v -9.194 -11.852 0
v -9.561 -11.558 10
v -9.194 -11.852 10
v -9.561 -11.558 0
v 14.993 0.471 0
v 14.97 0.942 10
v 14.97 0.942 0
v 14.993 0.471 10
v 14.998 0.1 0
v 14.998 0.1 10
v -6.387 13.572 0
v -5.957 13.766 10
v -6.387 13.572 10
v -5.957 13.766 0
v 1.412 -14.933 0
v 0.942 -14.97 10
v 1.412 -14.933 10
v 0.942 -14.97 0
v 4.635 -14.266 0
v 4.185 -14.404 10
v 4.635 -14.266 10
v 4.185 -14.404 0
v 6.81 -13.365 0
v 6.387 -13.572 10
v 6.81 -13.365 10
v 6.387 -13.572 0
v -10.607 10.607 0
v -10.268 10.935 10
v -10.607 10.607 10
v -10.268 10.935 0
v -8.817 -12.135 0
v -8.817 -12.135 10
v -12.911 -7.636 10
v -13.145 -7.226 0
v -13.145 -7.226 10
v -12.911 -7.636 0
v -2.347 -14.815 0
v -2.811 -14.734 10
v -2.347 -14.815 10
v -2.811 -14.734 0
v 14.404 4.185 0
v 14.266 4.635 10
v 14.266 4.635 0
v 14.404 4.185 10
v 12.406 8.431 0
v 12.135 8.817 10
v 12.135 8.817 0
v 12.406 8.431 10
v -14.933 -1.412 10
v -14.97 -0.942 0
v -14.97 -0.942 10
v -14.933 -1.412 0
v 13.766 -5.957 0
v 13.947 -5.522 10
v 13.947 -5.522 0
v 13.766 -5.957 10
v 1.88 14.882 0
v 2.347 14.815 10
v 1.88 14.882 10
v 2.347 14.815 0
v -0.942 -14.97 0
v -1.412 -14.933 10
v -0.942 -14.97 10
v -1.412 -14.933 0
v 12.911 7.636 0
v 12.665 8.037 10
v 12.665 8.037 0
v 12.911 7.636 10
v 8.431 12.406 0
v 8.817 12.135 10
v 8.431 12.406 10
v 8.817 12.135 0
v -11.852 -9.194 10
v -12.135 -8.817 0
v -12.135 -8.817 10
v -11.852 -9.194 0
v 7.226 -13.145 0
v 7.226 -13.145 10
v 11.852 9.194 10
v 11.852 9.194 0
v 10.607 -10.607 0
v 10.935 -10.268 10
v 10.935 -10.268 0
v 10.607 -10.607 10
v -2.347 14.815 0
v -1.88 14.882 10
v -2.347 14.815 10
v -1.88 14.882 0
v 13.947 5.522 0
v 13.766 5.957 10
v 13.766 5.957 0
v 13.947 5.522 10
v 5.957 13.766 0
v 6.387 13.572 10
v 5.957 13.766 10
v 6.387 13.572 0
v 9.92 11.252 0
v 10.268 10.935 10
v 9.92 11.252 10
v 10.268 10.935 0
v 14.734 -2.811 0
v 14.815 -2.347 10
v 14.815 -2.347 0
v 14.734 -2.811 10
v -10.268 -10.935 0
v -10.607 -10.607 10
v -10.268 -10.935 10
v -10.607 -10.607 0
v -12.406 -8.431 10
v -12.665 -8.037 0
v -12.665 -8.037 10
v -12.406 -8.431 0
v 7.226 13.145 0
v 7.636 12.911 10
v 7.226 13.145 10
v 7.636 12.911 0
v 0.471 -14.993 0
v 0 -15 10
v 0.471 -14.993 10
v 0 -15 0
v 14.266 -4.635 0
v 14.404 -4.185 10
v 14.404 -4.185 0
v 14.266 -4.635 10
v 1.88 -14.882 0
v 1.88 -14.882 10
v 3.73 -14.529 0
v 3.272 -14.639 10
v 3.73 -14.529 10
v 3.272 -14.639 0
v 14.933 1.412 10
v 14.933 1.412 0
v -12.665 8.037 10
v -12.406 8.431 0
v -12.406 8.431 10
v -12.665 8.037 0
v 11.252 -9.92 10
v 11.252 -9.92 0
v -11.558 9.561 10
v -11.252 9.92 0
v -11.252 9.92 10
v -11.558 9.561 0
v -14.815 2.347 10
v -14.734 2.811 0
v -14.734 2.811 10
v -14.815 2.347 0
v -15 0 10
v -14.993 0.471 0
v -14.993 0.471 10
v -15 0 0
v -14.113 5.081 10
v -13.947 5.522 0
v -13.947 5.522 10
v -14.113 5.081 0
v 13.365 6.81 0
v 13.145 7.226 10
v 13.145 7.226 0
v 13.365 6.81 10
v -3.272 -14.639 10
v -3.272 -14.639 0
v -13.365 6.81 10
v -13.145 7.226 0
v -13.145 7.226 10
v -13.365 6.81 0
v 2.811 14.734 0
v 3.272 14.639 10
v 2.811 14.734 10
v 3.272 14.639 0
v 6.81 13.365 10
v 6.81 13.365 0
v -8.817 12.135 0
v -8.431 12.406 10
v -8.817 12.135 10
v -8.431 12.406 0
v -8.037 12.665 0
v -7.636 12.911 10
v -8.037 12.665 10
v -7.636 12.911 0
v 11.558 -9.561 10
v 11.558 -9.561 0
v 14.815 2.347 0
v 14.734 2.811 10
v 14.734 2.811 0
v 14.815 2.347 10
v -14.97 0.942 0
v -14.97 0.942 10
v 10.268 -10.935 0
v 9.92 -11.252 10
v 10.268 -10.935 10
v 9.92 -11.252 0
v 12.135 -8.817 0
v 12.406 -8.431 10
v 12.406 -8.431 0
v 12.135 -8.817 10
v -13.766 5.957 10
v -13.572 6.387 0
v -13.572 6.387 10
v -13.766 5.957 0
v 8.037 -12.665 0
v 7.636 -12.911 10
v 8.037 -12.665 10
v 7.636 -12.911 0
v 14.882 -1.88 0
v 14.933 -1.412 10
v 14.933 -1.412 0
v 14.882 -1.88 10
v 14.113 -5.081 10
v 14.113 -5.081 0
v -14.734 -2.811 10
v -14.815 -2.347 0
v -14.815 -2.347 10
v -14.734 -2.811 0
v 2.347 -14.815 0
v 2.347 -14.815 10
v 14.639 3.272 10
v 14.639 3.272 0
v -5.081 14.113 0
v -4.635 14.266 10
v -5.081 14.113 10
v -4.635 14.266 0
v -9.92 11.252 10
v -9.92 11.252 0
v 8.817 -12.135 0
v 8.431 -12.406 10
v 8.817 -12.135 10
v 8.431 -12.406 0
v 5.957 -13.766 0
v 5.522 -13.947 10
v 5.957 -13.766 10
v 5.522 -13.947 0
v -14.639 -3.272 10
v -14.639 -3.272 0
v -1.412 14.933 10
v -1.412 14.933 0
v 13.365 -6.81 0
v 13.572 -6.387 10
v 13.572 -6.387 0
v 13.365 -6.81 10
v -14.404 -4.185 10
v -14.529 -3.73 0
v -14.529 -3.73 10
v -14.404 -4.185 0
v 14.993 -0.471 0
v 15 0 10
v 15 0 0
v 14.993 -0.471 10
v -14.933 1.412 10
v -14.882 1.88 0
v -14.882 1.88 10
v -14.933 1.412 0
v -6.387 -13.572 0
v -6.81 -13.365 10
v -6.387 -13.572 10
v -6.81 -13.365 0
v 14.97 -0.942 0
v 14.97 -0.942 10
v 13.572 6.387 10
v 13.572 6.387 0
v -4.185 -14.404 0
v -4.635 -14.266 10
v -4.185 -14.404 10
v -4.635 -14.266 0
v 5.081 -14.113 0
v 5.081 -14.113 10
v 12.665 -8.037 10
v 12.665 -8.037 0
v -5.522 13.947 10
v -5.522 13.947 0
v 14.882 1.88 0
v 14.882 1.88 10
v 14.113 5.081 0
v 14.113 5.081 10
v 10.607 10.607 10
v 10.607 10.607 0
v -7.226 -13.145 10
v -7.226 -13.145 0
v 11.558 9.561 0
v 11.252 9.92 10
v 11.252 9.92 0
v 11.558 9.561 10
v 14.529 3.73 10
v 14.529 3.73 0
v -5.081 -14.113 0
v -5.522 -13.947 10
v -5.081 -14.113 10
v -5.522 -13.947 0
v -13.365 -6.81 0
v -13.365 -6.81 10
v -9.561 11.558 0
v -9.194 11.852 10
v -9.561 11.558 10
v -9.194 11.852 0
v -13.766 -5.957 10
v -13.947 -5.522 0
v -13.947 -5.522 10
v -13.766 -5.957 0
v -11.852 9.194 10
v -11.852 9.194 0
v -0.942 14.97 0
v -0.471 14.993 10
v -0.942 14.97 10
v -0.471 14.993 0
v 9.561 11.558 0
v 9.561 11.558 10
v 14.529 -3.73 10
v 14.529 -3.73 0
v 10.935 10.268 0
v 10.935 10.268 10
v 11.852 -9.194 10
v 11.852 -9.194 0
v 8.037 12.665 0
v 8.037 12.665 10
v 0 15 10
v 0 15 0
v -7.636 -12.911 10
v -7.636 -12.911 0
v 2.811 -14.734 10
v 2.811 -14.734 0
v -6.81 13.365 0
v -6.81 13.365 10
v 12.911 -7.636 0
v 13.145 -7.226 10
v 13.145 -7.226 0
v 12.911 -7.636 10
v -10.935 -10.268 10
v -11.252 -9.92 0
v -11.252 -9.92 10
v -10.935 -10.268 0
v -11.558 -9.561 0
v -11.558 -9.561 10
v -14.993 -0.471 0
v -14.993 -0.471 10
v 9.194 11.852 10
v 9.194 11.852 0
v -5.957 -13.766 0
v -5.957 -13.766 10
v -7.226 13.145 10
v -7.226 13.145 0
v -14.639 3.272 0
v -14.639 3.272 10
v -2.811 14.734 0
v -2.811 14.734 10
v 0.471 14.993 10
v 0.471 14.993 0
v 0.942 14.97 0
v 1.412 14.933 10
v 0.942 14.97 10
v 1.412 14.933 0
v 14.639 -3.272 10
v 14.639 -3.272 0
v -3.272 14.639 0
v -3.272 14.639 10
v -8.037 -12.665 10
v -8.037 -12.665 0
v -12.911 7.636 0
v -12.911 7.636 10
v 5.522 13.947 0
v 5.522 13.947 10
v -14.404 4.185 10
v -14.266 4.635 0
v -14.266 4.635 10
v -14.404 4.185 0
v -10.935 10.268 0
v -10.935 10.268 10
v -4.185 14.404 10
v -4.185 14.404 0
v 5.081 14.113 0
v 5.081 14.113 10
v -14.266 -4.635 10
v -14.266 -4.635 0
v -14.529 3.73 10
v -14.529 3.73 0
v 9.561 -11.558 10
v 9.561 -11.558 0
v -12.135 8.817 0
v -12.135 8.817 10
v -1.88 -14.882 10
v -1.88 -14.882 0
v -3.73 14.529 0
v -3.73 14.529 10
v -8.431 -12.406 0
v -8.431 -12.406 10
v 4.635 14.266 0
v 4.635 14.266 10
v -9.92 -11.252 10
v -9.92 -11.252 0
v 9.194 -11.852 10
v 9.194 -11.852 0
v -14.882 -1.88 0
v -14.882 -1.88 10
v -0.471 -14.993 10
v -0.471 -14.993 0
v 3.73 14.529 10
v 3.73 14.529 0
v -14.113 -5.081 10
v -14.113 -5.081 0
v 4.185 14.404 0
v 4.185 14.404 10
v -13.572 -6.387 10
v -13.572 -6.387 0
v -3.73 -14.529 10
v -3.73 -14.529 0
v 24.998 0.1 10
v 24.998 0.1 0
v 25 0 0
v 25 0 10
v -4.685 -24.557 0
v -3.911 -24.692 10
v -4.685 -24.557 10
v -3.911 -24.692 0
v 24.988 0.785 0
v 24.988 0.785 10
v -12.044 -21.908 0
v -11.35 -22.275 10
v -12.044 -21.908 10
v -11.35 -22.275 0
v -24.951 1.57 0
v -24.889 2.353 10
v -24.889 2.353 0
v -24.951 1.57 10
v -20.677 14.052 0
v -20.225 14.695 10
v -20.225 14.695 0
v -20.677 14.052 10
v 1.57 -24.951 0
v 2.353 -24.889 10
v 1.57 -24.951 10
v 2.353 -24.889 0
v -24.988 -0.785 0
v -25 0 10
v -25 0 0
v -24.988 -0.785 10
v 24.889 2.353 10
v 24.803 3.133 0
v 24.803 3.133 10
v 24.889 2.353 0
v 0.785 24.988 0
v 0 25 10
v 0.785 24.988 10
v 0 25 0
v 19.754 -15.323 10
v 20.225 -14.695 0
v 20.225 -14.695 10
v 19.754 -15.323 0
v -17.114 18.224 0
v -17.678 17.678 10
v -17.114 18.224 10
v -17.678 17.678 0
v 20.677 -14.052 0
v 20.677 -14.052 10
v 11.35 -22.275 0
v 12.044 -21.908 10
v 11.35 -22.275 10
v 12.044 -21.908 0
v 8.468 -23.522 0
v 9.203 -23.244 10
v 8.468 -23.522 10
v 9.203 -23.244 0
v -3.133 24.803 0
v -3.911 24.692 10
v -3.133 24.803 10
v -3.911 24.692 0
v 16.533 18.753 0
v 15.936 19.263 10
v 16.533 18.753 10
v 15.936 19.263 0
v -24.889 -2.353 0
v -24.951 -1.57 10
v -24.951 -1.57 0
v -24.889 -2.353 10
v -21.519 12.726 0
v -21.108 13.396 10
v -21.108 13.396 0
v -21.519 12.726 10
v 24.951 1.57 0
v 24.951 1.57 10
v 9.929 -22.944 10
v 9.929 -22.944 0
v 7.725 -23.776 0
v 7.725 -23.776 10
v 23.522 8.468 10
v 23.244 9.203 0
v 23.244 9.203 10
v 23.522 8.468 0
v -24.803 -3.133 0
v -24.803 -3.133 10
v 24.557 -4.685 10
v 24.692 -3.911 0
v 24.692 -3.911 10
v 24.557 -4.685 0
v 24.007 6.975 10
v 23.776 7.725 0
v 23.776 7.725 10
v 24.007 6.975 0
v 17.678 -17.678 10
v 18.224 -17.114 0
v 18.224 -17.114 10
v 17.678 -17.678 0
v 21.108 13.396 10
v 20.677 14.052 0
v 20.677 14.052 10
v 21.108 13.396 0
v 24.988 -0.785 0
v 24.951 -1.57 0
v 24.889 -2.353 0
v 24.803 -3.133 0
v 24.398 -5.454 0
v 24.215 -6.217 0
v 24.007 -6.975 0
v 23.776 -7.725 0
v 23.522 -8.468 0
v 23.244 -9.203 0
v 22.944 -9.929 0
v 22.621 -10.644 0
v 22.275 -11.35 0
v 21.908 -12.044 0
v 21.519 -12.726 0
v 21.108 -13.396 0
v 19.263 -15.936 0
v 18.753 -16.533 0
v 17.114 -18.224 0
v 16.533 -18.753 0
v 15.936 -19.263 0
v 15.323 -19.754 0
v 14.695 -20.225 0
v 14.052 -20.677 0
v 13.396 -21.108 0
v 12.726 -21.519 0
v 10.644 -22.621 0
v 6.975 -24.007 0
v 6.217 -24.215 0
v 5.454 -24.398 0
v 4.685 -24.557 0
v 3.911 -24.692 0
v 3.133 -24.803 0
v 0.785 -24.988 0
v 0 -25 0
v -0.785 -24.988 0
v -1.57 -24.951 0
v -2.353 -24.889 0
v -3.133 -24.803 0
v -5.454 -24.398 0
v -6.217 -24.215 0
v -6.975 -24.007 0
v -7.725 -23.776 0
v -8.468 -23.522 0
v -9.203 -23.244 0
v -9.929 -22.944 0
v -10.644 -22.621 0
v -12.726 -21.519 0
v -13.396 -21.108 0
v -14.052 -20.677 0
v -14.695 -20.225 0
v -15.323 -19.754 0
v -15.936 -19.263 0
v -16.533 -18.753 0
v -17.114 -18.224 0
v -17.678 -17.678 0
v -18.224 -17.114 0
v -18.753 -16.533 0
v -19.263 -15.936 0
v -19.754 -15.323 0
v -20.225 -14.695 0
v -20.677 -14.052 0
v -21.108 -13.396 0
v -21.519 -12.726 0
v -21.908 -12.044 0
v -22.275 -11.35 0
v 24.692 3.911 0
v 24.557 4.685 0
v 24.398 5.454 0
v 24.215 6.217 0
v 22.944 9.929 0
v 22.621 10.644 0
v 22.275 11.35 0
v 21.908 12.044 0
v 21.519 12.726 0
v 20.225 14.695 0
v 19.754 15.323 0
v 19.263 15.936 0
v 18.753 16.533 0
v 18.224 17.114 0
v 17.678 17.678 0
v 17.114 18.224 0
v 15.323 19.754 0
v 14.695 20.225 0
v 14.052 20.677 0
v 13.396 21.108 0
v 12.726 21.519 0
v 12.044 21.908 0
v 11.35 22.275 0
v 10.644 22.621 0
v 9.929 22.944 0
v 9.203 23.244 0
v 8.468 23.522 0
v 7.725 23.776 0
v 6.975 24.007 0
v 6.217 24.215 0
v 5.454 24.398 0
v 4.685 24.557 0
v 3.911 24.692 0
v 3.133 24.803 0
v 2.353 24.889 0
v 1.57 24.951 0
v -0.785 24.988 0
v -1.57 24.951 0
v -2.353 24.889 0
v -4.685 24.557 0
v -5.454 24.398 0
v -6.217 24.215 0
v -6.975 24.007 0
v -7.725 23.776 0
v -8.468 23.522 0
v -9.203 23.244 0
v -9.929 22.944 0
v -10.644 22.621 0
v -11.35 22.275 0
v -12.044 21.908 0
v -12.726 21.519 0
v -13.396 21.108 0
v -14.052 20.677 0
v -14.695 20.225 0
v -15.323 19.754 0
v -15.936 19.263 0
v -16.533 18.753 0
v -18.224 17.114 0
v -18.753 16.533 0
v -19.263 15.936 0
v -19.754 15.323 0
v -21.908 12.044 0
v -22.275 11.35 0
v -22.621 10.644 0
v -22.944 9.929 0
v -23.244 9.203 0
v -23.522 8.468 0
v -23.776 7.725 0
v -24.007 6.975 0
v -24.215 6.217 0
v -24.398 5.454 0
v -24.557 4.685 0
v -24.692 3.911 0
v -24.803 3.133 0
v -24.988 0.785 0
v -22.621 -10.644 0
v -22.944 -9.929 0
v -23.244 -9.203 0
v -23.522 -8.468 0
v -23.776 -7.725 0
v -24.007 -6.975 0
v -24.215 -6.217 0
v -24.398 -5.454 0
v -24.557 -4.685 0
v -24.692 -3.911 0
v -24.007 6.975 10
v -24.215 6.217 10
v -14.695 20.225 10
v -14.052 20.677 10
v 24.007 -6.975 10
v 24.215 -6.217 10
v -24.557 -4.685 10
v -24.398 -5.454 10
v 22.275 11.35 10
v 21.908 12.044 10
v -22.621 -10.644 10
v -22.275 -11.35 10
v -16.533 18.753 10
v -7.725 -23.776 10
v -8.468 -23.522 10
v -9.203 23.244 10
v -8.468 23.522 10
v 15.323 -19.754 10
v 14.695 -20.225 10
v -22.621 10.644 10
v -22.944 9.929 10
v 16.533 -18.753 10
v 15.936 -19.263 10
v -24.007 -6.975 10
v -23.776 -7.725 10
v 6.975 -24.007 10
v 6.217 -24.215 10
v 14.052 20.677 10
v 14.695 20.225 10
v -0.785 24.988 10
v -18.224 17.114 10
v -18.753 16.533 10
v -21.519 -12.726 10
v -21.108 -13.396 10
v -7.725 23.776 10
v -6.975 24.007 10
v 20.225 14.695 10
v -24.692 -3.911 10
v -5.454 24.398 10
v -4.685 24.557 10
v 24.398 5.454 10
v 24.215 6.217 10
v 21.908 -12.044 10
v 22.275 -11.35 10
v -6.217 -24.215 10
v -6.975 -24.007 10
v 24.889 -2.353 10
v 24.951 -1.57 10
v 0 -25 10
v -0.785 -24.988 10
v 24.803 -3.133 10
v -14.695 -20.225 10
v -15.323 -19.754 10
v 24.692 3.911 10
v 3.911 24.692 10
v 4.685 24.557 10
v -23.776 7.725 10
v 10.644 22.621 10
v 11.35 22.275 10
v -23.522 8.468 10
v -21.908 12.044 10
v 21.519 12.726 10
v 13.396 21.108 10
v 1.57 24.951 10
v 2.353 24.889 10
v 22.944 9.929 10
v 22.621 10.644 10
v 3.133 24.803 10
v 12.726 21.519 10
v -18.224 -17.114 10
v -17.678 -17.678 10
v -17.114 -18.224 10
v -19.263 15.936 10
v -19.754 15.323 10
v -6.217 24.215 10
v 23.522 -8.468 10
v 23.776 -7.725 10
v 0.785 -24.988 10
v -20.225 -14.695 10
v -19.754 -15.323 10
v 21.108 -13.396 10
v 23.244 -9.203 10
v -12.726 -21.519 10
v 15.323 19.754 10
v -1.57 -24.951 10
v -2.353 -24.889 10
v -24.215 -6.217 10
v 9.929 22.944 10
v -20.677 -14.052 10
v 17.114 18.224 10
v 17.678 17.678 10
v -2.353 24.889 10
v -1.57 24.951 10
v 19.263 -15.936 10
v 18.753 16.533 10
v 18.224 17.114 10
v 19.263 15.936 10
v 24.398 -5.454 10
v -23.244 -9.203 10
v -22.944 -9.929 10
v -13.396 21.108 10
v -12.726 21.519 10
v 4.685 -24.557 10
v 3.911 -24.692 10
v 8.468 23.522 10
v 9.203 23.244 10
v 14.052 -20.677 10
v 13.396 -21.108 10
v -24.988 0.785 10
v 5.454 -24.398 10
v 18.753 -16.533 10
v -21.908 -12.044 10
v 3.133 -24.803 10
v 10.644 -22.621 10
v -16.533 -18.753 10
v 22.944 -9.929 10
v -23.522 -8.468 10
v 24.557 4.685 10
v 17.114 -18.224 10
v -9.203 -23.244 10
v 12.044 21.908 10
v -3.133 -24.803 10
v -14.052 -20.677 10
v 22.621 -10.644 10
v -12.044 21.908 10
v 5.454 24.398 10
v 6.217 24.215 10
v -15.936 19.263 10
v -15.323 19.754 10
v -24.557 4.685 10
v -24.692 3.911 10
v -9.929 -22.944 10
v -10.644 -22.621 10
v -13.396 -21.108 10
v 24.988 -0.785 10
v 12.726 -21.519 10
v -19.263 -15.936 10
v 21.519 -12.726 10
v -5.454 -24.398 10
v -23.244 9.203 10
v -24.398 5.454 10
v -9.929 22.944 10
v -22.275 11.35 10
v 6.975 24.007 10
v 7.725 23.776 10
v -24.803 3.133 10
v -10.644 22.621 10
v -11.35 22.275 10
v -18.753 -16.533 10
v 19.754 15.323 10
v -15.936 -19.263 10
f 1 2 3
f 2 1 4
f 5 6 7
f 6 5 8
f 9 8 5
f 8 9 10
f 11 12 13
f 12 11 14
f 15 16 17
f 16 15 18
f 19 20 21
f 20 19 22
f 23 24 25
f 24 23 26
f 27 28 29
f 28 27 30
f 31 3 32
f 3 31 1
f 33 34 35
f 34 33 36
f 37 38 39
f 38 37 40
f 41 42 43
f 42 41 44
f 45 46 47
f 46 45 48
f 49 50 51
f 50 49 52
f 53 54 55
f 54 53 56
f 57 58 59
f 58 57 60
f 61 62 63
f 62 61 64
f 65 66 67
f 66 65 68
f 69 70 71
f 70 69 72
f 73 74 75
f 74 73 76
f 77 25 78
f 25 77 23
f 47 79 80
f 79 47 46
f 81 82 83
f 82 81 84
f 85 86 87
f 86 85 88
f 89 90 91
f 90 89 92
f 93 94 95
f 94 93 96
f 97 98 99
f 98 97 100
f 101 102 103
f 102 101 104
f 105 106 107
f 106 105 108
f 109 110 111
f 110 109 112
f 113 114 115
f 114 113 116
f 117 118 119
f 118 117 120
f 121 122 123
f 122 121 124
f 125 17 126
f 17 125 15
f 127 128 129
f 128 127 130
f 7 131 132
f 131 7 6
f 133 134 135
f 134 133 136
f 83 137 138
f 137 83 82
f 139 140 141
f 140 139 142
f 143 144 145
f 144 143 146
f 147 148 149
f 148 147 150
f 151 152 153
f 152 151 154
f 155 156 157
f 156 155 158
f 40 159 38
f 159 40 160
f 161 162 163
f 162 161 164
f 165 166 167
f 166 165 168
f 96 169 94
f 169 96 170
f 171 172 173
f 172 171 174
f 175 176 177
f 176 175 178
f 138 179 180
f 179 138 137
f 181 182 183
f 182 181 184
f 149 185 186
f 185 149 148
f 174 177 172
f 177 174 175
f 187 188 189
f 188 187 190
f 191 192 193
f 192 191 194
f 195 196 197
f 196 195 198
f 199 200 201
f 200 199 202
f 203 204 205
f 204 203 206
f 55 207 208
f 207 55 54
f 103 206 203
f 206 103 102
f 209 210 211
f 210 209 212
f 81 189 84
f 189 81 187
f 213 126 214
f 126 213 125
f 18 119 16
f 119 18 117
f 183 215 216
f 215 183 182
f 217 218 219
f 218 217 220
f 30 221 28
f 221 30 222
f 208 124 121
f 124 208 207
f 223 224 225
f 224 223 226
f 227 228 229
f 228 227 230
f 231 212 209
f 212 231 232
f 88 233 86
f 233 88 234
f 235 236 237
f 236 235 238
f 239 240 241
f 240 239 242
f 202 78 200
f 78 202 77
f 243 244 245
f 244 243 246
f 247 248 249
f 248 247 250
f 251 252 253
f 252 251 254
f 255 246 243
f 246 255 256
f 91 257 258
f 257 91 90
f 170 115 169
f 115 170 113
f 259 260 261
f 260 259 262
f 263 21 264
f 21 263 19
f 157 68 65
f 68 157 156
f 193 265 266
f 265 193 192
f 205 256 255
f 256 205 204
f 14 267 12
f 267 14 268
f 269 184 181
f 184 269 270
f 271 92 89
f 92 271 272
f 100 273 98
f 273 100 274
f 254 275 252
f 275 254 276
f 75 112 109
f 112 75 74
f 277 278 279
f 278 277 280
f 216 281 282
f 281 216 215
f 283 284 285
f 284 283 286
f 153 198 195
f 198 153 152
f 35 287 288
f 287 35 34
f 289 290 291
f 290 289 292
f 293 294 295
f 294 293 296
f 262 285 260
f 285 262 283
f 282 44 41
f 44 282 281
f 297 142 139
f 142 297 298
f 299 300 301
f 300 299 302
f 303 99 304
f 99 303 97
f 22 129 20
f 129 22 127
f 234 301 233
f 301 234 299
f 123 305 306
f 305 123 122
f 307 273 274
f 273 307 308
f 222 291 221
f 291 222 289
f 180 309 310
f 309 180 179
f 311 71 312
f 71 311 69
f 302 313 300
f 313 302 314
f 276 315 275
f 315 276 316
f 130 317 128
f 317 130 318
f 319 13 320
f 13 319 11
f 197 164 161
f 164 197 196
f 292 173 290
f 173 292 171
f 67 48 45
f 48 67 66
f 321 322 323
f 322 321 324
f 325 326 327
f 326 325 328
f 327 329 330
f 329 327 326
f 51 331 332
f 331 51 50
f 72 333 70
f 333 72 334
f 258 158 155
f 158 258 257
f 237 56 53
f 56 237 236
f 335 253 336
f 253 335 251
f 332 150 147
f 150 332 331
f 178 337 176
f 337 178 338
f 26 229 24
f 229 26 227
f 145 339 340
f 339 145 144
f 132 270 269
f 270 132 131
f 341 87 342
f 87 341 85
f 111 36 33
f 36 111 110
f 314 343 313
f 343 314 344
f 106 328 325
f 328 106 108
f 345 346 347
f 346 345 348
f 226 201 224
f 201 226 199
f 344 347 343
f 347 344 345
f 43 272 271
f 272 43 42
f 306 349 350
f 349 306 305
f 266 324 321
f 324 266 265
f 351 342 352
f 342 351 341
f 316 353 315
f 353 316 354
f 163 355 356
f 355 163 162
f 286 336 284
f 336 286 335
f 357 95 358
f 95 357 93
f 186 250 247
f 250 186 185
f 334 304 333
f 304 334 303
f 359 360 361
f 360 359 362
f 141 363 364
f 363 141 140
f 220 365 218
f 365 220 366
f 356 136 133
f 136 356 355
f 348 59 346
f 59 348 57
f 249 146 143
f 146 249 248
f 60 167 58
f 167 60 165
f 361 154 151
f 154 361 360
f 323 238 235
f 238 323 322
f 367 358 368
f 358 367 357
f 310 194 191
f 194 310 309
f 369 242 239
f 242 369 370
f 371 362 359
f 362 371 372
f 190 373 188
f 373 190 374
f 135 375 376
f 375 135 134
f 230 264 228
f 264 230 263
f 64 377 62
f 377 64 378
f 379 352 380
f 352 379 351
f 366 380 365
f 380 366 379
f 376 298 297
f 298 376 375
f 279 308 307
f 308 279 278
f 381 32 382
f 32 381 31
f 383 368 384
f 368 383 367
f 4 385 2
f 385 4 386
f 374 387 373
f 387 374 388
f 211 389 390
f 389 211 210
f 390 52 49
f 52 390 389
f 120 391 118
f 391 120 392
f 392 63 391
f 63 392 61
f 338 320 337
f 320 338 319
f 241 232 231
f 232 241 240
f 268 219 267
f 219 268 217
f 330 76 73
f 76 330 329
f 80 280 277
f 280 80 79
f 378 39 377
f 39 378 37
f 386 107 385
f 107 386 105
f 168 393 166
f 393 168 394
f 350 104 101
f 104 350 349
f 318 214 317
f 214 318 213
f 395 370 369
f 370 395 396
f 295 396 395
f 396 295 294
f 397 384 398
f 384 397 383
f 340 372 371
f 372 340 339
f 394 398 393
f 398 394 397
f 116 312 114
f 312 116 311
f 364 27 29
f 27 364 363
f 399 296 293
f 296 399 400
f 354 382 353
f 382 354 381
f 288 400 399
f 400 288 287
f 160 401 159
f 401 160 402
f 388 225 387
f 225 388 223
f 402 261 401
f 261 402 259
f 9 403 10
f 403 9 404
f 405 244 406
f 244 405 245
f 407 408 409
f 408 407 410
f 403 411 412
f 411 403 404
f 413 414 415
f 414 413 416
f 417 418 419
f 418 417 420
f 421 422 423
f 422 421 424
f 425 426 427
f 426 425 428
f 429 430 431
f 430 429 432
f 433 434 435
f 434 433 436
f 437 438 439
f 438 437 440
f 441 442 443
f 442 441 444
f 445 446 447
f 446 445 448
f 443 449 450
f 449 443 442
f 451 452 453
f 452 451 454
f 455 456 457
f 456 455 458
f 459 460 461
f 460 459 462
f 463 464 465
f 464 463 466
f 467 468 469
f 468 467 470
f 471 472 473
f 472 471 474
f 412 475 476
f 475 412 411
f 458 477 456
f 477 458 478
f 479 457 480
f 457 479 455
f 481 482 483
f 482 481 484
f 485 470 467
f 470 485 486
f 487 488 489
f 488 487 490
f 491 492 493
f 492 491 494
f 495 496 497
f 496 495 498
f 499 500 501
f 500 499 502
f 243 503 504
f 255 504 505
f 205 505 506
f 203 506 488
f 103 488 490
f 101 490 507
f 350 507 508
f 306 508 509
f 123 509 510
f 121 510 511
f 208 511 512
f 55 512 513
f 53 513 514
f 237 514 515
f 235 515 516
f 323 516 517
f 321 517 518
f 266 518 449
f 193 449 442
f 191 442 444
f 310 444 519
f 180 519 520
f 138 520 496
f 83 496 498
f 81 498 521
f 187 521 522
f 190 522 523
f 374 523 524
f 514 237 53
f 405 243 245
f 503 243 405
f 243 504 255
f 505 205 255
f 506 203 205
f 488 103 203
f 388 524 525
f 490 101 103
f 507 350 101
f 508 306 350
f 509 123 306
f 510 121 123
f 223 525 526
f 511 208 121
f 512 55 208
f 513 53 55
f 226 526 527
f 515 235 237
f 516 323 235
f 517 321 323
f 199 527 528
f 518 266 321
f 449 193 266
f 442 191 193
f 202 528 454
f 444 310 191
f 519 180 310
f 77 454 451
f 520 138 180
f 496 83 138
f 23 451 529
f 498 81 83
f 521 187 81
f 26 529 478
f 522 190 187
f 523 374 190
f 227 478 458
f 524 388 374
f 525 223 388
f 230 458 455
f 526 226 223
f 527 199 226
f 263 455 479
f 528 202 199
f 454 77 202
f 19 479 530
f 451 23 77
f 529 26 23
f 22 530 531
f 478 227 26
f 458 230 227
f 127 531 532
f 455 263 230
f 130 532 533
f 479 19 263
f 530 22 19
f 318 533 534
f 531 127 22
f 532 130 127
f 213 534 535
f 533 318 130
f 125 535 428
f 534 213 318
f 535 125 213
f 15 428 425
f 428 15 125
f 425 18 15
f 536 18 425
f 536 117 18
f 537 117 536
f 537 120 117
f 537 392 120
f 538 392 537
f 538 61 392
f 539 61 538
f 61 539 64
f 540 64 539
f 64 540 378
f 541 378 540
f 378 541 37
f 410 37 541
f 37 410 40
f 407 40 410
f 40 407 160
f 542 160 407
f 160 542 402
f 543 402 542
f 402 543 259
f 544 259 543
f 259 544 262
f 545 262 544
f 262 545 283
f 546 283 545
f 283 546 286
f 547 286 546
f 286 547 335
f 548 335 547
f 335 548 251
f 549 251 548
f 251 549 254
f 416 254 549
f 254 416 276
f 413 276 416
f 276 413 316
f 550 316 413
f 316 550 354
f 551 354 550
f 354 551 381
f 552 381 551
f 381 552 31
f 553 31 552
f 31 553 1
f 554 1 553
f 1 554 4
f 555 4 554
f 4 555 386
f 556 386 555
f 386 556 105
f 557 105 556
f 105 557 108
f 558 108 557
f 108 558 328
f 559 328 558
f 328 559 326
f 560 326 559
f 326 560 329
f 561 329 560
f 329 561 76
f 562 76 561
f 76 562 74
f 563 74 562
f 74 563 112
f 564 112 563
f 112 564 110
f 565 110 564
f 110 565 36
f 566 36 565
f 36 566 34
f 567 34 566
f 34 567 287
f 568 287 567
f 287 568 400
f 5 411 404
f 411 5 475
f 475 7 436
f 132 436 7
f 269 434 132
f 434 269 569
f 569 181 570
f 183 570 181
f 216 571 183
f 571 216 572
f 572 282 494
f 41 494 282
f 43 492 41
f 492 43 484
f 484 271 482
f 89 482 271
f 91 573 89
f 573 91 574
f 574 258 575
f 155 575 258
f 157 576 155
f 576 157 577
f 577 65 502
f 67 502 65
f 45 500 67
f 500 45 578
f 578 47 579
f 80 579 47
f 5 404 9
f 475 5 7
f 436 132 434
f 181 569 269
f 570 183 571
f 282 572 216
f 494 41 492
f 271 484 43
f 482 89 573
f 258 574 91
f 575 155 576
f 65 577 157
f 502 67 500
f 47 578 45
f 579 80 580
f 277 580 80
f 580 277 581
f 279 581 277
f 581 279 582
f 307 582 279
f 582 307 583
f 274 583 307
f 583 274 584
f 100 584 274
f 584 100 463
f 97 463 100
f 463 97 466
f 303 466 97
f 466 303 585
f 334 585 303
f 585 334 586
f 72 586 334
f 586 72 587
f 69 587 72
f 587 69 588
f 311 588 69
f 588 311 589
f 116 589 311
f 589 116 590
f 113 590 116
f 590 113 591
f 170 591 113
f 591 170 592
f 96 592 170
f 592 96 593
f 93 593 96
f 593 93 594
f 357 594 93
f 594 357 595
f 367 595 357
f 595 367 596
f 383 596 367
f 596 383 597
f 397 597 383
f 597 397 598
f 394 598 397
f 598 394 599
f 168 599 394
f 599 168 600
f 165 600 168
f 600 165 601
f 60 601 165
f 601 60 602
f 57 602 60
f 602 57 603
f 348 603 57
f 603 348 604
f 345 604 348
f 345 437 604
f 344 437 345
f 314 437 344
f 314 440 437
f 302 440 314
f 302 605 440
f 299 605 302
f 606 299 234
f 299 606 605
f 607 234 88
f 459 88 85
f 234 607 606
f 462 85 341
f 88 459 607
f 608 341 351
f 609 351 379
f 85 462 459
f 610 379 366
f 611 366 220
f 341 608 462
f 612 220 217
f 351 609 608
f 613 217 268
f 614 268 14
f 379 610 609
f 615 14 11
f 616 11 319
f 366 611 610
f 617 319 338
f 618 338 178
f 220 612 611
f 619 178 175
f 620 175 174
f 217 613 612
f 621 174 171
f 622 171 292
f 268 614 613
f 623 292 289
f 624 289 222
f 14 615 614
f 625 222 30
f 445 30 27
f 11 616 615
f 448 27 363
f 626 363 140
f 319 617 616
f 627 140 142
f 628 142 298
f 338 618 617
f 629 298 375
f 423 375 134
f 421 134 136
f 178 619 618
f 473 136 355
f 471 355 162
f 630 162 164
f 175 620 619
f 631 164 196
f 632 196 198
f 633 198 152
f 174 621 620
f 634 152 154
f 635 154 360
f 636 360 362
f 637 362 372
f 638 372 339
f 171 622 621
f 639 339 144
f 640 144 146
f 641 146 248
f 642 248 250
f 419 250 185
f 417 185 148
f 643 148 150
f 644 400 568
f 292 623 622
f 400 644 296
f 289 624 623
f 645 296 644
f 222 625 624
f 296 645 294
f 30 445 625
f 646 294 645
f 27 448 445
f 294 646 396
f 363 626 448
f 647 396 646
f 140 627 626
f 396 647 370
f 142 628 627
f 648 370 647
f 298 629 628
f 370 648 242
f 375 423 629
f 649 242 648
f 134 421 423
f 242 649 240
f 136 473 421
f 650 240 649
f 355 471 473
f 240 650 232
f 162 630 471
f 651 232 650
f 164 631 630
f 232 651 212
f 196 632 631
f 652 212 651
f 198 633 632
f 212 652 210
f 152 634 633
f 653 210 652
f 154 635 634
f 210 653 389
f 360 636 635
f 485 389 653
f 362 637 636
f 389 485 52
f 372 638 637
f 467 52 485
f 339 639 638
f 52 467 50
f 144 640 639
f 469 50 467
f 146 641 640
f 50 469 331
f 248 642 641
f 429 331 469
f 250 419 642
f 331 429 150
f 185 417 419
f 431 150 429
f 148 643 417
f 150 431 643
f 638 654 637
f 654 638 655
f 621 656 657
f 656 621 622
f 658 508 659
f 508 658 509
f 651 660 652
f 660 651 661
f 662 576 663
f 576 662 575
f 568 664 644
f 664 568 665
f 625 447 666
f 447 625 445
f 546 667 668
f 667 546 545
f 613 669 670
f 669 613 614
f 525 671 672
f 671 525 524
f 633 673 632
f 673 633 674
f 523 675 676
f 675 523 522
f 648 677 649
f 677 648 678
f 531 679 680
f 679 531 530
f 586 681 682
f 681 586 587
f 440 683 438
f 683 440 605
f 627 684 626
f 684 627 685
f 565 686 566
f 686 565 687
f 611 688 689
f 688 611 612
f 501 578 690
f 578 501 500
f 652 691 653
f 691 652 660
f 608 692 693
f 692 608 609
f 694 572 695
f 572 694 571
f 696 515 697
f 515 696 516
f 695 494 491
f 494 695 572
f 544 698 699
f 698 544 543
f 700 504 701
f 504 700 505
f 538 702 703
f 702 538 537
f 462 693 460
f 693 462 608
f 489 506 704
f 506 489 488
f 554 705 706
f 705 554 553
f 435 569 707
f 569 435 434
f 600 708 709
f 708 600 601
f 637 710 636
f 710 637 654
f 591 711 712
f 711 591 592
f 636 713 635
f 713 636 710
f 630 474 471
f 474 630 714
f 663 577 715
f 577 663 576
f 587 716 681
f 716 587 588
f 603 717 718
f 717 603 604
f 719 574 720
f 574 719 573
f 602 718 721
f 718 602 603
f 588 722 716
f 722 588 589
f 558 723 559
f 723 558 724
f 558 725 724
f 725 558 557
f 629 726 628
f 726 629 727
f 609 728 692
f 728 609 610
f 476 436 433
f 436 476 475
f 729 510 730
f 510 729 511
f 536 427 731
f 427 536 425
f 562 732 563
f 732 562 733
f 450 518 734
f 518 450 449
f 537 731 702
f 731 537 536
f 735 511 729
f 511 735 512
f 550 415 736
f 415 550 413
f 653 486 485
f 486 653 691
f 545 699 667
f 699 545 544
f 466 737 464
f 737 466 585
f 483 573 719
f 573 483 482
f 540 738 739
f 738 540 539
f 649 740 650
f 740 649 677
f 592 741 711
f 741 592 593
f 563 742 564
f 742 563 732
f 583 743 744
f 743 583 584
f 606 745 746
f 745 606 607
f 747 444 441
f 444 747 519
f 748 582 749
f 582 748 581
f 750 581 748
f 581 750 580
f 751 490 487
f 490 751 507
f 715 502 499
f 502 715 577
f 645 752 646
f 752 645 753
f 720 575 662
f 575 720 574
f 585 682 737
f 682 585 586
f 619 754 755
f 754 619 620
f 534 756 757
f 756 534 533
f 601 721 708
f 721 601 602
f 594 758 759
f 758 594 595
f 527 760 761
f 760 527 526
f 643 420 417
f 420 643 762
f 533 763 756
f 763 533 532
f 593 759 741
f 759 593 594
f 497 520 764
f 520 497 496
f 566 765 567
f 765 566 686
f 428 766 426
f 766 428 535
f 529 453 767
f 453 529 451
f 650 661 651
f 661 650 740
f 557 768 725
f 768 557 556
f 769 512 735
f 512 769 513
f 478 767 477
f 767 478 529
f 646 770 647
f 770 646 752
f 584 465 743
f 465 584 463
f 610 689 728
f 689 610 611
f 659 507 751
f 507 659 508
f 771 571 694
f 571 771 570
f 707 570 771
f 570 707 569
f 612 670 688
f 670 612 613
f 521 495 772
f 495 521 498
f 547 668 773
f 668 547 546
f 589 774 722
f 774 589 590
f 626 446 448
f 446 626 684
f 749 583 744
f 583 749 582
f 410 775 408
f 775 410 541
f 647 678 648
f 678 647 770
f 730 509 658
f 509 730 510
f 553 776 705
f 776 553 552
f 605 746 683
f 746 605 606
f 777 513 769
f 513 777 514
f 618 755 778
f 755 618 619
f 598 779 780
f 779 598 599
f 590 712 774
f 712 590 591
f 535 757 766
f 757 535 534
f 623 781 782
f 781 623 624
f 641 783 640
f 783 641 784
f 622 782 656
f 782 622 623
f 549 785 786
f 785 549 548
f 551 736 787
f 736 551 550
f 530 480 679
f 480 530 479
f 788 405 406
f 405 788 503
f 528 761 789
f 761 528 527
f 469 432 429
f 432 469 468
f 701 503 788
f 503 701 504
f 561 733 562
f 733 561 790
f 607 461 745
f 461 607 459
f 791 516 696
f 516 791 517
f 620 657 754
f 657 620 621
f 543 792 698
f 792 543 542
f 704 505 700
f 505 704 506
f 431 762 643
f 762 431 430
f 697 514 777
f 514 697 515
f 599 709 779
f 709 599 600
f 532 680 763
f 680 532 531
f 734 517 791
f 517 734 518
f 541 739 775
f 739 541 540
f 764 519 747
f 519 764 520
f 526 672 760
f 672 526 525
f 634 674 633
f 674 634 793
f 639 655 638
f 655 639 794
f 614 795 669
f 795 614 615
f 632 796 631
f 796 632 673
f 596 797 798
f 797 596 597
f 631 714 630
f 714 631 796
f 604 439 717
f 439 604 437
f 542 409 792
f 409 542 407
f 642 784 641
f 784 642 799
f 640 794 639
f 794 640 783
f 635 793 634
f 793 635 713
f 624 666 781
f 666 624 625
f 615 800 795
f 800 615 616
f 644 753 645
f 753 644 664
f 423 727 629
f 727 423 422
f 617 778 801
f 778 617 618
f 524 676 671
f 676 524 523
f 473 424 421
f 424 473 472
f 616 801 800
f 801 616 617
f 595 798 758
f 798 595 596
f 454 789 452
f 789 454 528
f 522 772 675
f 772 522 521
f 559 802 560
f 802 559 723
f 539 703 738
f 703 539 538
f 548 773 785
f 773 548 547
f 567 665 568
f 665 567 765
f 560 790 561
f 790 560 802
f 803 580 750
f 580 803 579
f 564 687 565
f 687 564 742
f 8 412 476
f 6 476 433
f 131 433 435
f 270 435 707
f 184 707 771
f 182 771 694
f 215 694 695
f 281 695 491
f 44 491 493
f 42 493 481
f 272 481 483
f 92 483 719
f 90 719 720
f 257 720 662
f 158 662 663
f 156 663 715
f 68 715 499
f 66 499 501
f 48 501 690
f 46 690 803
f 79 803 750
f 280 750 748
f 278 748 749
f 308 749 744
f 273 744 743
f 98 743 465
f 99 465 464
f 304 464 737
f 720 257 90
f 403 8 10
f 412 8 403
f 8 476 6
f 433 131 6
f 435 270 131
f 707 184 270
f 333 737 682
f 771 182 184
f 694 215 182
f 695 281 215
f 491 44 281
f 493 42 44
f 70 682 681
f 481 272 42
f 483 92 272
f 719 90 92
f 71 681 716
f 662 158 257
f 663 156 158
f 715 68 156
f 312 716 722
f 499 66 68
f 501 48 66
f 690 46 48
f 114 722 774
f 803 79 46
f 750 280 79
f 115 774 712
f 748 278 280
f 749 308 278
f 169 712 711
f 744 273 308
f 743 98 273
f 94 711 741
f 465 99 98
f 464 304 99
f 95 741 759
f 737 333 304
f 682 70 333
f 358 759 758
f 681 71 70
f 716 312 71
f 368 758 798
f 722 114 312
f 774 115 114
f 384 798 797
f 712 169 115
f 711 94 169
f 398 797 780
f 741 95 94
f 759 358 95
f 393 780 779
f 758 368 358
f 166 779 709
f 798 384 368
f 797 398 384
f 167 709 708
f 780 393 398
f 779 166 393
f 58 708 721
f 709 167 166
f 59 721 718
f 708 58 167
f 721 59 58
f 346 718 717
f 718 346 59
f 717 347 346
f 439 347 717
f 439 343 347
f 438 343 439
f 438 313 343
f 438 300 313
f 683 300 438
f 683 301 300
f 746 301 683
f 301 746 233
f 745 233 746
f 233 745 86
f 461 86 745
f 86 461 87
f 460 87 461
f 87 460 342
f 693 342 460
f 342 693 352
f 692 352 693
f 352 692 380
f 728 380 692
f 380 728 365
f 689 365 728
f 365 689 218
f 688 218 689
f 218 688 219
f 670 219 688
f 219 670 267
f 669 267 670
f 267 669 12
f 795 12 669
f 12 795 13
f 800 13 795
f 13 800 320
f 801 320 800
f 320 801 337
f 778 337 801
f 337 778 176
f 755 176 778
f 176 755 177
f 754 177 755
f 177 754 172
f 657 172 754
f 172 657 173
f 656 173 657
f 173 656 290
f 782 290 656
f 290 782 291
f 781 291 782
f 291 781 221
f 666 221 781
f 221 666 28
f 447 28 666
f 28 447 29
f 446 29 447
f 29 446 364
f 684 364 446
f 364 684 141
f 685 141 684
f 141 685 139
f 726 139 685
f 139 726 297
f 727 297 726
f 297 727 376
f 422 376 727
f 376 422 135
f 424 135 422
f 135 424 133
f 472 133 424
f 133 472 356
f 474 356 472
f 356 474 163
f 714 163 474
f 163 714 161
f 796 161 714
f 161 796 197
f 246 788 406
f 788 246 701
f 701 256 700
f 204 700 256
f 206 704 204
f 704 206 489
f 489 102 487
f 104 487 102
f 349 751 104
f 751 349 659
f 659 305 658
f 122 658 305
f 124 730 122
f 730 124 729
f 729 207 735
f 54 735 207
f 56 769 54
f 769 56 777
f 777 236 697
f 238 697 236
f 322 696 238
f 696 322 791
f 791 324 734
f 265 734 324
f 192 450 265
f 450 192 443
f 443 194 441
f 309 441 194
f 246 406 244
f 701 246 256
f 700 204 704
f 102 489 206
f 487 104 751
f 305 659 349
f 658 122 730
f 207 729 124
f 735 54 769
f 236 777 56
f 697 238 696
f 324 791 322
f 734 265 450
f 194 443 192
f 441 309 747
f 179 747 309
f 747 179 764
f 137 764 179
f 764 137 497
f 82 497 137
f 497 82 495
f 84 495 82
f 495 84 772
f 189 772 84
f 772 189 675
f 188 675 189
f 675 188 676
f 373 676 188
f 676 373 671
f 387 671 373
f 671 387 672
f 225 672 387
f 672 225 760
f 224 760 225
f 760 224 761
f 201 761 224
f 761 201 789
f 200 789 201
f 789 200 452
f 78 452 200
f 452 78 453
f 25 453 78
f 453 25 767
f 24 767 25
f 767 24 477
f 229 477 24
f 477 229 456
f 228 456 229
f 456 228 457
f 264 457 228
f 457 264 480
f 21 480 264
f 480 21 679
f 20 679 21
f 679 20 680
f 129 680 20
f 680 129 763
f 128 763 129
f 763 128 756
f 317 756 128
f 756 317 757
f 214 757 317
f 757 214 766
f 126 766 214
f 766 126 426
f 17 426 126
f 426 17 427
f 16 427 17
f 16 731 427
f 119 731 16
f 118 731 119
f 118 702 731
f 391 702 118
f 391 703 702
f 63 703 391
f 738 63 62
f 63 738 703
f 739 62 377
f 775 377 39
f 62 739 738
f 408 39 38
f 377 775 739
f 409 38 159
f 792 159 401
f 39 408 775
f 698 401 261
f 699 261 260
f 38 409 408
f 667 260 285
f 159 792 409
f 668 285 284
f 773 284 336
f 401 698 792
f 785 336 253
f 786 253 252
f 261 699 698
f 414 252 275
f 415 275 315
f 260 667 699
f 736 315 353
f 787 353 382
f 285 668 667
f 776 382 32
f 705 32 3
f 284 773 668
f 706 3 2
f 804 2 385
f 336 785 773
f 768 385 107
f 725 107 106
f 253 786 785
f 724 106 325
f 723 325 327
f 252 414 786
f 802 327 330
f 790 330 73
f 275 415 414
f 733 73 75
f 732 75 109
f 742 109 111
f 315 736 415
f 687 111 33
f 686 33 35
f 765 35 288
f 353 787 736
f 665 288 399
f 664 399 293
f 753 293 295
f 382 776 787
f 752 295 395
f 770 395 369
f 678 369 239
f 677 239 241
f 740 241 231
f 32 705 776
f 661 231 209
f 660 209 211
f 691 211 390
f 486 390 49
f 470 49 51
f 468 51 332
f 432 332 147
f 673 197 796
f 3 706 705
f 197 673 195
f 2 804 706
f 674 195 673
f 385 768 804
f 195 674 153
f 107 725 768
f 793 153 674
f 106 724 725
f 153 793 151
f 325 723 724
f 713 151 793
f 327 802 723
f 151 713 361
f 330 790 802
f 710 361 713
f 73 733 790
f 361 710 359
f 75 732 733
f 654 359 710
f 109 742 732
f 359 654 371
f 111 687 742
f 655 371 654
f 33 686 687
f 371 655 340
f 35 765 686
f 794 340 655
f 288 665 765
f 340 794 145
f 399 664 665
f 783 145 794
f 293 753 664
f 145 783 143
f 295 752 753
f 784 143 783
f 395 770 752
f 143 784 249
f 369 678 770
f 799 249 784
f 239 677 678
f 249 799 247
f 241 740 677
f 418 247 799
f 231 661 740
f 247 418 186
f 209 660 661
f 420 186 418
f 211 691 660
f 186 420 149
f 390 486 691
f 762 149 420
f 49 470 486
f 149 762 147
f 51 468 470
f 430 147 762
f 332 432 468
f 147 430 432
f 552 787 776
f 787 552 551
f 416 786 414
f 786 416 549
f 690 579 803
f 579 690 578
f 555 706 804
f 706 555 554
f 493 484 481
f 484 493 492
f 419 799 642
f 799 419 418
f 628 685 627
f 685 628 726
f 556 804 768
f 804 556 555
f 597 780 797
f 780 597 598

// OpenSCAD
$fn=200;


difference(){
    cylinder(d=50, h=10);
    
    translate([0,0,-.1]){
    cylinder(d=30, h=11);
    
    cube([50,.1,11]);
    }
}
